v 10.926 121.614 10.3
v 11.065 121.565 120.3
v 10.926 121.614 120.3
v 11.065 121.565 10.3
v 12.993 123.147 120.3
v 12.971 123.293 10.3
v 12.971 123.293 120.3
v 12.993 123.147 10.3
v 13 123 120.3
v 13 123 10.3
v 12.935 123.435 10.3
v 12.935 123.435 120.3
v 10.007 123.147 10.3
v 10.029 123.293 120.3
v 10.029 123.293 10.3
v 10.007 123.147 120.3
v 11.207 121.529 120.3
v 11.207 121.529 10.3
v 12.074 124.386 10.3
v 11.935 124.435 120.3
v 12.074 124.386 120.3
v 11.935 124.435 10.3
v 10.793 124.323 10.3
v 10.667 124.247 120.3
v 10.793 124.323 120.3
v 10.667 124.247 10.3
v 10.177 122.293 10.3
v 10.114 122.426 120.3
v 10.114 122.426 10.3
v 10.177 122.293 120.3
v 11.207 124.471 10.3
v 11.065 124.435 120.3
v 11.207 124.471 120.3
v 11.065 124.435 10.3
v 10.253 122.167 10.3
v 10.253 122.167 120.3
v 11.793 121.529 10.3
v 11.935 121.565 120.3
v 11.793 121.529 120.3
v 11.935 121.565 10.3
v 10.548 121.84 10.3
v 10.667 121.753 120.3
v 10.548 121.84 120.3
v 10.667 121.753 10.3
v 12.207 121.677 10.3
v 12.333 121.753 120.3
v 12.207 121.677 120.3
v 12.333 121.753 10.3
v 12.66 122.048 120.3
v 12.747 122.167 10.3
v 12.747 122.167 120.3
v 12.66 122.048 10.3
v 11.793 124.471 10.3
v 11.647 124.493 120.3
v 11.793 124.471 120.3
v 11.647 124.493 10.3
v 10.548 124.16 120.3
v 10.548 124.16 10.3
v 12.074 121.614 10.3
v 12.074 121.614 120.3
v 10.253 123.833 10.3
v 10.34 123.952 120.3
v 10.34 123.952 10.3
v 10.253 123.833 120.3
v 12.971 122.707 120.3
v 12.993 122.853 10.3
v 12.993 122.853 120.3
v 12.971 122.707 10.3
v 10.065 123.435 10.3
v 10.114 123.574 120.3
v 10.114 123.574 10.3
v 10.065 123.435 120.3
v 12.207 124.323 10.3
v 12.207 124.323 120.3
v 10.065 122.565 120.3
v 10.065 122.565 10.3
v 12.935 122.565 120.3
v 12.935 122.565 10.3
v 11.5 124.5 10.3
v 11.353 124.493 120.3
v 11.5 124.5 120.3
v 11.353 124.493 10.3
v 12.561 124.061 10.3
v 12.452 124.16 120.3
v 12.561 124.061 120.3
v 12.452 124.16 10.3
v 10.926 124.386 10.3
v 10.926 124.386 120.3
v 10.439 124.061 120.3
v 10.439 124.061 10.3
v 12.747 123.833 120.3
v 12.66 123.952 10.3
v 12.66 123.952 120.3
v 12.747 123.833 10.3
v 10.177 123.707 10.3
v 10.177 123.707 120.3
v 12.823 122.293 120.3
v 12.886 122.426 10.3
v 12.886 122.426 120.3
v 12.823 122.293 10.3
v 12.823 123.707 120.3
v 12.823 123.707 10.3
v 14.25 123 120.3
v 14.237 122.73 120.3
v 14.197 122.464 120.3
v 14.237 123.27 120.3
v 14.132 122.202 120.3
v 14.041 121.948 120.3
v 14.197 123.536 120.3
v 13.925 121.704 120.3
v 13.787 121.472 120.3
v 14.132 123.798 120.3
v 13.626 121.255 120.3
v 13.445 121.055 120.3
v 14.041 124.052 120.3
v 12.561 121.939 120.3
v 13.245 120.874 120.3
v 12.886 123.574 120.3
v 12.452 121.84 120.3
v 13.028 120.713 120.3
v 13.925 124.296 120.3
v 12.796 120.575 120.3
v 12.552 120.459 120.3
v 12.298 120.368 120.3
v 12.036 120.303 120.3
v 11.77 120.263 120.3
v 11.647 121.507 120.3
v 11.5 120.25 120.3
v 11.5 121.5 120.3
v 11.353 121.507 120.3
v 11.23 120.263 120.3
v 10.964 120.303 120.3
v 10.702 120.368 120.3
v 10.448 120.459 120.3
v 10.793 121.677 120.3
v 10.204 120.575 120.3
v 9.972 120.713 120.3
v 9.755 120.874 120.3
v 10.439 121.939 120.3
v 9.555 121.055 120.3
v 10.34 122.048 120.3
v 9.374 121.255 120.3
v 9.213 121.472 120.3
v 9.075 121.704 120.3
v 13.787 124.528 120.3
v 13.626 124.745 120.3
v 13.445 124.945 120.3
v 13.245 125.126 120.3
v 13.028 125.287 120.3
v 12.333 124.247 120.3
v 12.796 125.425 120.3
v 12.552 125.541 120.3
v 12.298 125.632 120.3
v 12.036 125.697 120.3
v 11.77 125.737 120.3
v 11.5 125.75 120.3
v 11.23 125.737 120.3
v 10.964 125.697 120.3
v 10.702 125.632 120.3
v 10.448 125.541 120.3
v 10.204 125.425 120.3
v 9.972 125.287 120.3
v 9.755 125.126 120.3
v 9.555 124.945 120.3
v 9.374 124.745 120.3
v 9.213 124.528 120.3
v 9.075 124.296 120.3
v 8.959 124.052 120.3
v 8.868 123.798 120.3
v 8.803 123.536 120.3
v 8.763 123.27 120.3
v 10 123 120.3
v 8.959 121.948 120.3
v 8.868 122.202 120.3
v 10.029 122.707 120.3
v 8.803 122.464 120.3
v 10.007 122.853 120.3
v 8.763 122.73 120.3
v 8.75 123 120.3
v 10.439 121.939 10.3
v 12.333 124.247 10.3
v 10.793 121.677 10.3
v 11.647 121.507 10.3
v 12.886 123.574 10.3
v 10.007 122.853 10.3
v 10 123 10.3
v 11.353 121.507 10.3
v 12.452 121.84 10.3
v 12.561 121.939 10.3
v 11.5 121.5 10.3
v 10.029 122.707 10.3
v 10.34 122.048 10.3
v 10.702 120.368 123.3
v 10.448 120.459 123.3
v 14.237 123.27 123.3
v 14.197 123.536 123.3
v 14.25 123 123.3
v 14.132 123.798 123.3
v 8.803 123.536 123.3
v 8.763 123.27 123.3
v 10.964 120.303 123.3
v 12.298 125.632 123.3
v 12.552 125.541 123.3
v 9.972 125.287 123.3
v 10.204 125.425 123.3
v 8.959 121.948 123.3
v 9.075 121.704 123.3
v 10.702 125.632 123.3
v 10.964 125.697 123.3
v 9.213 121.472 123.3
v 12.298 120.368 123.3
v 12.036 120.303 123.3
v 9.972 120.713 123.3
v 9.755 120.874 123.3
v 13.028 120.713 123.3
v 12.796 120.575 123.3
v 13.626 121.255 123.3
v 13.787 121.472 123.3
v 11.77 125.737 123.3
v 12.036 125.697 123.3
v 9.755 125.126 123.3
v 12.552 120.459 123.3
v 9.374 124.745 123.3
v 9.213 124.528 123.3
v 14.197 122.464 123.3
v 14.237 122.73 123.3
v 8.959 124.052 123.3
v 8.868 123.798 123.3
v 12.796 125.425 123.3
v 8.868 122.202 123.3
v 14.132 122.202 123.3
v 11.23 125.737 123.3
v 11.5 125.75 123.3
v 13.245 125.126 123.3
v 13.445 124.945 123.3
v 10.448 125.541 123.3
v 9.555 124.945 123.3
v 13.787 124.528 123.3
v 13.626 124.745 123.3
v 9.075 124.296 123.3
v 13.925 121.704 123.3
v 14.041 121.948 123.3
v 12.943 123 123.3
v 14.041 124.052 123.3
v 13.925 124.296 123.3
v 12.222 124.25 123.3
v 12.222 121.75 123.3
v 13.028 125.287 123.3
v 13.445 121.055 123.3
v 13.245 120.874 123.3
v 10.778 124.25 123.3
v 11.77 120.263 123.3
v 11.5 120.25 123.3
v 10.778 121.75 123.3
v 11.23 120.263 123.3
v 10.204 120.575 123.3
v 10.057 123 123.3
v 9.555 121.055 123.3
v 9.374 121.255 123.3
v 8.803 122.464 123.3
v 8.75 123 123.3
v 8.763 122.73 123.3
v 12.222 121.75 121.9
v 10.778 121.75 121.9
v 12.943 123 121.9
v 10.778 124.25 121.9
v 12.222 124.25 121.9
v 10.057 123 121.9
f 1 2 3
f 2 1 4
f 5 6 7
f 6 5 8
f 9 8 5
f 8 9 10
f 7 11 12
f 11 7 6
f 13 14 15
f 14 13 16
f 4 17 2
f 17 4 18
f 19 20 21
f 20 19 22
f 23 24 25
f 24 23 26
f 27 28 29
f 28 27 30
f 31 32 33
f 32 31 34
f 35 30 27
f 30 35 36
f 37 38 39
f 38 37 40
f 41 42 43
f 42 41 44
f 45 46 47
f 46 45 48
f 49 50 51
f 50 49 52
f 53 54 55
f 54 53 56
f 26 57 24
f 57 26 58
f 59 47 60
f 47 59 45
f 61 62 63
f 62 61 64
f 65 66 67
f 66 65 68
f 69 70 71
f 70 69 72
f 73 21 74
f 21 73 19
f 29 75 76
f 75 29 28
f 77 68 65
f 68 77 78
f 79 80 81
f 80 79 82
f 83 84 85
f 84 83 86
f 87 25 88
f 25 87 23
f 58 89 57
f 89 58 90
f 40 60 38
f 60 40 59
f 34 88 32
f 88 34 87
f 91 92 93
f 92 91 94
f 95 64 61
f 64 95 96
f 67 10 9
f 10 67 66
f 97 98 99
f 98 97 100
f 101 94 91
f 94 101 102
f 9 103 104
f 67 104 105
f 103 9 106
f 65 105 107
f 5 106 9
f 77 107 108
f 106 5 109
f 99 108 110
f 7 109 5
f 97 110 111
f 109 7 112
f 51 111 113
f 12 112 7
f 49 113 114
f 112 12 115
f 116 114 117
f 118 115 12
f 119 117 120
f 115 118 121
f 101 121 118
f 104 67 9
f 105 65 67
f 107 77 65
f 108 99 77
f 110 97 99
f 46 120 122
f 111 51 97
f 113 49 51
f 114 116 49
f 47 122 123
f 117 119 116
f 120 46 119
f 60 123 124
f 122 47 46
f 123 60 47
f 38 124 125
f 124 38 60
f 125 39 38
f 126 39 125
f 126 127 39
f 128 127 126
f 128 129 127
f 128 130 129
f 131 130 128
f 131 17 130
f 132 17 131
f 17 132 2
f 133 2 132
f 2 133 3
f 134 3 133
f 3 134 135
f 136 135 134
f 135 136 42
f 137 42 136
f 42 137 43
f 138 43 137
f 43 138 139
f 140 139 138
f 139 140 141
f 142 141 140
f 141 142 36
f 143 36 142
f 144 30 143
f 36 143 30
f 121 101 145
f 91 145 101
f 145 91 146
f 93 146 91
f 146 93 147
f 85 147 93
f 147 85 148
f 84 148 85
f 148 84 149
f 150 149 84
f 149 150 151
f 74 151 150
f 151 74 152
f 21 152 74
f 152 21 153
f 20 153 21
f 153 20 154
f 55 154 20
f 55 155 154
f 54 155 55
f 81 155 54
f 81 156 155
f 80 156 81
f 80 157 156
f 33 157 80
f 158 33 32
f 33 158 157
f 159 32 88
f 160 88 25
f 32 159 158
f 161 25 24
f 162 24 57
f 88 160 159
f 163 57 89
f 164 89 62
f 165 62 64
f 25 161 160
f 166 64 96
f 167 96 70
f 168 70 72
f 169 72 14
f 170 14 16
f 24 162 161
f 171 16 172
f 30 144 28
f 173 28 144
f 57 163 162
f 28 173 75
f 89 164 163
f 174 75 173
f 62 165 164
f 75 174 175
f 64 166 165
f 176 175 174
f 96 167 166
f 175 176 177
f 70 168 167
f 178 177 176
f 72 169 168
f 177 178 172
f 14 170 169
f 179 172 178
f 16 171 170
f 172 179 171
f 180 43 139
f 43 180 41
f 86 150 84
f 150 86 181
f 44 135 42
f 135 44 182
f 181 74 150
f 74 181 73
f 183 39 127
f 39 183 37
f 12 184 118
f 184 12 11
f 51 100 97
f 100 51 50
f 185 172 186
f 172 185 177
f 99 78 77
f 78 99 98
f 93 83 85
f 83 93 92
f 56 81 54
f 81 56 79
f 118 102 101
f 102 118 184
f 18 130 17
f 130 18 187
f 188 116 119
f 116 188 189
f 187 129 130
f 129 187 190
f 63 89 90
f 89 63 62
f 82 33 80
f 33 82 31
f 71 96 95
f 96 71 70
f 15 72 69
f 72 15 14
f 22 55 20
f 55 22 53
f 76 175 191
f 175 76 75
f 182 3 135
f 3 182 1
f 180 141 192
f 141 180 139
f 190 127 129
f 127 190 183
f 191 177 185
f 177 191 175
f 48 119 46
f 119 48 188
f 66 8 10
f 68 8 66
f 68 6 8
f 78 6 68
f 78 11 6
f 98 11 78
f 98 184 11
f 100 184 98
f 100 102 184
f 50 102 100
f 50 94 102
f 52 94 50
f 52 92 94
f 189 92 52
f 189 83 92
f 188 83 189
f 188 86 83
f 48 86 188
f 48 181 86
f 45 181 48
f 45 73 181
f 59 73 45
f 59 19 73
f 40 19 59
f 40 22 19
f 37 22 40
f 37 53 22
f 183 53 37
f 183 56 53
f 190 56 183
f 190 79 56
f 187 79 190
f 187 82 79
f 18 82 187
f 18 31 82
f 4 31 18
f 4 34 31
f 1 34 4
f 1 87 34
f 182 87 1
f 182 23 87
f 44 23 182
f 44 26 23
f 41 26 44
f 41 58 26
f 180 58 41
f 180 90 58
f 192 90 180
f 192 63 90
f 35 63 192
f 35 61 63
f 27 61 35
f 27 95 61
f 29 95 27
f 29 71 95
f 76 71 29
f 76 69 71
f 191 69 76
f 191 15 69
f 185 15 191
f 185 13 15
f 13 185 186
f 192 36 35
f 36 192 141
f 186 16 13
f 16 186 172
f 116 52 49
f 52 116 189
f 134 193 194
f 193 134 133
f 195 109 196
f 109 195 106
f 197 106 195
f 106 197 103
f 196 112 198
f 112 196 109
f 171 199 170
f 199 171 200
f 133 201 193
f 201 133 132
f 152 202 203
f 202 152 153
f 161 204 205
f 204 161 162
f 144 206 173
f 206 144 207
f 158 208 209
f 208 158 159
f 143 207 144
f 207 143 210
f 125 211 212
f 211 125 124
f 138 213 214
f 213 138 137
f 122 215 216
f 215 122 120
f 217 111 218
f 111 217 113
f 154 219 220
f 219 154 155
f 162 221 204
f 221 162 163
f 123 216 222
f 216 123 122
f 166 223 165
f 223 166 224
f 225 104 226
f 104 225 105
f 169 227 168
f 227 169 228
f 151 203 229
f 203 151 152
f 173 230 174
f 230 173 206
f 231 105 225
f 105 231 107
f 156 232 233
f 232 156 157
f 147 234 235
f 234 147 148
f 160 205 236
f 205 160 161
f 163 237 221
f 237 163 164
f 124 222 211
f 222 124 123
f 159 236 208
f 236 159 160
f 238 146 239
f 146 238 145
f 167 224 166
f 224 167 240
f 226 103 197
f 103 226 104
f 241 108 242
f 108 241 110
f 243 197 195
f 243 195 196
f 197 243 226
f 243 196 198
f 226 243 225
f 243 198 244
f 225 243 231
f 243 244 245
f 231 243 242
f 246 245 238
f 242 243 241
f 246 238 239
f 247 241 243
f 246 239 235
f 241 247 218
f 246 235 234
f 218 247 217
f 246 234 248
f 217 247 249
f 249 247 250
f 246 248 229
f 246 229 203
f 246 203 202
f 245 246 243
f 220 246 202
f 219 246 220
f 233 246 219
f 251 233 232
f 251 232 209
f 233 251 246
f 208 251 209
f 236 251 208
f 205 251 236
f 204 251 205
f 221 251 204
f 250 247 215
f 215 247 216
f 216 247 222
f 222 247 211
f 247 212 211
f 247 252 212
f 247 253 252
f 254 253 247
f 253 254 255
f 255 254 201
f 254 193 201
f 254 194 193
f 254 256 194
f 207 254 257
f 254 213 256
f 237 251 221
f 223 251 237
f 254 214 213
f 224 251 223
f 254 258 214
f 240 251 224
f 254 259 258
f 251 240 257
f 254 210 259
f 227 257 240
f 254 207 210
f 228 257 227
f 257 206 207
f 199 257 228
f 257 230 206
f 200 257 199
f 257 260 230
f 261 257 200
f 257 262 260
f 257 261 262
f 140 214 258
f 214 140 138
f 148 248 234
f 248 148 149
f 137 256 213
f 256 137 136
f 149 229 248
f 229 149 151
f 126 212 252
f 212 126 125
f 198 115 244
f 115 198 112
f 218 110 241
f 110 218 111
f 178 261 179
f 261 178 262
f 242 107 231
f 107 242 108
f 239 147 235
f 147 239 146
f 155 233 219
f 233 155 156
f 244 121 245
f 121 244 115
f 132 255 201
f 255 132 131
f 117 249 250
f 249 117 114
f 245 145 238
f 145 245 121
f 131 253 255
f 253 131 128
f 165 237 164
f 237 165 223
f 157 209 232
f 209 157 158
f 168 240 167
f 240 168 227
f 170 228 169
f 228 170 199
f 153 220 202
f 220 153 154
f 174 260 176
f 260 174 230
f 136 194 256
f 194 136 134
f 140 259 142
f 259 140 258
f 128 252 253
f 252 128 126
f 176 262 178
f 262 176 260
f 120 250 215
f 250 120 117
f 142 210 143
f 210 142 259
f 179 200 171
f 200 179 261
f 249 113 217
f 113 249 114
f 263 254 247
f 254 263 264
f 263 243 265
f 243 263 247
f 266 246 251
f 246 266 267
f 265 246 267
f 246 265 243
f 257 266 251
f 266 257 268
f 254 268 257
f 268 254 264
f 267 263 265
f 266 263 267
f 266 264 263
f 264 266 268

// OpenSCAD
// Generated from the same CSG operations as STEP. Rebuild with spec/build_parent_hand_service.py.
difference(){union(){translate([11.5,123,10.3]) cylinder(r=1.5,h=110,$fn=64);translate([11.5,123,120.3]) cylinder(r=2.75,h=3,$fn=64);}translate([11.5,123,121.9]) cylinder(r=1.4433756729740643,h=1.5,$fn=6);}
